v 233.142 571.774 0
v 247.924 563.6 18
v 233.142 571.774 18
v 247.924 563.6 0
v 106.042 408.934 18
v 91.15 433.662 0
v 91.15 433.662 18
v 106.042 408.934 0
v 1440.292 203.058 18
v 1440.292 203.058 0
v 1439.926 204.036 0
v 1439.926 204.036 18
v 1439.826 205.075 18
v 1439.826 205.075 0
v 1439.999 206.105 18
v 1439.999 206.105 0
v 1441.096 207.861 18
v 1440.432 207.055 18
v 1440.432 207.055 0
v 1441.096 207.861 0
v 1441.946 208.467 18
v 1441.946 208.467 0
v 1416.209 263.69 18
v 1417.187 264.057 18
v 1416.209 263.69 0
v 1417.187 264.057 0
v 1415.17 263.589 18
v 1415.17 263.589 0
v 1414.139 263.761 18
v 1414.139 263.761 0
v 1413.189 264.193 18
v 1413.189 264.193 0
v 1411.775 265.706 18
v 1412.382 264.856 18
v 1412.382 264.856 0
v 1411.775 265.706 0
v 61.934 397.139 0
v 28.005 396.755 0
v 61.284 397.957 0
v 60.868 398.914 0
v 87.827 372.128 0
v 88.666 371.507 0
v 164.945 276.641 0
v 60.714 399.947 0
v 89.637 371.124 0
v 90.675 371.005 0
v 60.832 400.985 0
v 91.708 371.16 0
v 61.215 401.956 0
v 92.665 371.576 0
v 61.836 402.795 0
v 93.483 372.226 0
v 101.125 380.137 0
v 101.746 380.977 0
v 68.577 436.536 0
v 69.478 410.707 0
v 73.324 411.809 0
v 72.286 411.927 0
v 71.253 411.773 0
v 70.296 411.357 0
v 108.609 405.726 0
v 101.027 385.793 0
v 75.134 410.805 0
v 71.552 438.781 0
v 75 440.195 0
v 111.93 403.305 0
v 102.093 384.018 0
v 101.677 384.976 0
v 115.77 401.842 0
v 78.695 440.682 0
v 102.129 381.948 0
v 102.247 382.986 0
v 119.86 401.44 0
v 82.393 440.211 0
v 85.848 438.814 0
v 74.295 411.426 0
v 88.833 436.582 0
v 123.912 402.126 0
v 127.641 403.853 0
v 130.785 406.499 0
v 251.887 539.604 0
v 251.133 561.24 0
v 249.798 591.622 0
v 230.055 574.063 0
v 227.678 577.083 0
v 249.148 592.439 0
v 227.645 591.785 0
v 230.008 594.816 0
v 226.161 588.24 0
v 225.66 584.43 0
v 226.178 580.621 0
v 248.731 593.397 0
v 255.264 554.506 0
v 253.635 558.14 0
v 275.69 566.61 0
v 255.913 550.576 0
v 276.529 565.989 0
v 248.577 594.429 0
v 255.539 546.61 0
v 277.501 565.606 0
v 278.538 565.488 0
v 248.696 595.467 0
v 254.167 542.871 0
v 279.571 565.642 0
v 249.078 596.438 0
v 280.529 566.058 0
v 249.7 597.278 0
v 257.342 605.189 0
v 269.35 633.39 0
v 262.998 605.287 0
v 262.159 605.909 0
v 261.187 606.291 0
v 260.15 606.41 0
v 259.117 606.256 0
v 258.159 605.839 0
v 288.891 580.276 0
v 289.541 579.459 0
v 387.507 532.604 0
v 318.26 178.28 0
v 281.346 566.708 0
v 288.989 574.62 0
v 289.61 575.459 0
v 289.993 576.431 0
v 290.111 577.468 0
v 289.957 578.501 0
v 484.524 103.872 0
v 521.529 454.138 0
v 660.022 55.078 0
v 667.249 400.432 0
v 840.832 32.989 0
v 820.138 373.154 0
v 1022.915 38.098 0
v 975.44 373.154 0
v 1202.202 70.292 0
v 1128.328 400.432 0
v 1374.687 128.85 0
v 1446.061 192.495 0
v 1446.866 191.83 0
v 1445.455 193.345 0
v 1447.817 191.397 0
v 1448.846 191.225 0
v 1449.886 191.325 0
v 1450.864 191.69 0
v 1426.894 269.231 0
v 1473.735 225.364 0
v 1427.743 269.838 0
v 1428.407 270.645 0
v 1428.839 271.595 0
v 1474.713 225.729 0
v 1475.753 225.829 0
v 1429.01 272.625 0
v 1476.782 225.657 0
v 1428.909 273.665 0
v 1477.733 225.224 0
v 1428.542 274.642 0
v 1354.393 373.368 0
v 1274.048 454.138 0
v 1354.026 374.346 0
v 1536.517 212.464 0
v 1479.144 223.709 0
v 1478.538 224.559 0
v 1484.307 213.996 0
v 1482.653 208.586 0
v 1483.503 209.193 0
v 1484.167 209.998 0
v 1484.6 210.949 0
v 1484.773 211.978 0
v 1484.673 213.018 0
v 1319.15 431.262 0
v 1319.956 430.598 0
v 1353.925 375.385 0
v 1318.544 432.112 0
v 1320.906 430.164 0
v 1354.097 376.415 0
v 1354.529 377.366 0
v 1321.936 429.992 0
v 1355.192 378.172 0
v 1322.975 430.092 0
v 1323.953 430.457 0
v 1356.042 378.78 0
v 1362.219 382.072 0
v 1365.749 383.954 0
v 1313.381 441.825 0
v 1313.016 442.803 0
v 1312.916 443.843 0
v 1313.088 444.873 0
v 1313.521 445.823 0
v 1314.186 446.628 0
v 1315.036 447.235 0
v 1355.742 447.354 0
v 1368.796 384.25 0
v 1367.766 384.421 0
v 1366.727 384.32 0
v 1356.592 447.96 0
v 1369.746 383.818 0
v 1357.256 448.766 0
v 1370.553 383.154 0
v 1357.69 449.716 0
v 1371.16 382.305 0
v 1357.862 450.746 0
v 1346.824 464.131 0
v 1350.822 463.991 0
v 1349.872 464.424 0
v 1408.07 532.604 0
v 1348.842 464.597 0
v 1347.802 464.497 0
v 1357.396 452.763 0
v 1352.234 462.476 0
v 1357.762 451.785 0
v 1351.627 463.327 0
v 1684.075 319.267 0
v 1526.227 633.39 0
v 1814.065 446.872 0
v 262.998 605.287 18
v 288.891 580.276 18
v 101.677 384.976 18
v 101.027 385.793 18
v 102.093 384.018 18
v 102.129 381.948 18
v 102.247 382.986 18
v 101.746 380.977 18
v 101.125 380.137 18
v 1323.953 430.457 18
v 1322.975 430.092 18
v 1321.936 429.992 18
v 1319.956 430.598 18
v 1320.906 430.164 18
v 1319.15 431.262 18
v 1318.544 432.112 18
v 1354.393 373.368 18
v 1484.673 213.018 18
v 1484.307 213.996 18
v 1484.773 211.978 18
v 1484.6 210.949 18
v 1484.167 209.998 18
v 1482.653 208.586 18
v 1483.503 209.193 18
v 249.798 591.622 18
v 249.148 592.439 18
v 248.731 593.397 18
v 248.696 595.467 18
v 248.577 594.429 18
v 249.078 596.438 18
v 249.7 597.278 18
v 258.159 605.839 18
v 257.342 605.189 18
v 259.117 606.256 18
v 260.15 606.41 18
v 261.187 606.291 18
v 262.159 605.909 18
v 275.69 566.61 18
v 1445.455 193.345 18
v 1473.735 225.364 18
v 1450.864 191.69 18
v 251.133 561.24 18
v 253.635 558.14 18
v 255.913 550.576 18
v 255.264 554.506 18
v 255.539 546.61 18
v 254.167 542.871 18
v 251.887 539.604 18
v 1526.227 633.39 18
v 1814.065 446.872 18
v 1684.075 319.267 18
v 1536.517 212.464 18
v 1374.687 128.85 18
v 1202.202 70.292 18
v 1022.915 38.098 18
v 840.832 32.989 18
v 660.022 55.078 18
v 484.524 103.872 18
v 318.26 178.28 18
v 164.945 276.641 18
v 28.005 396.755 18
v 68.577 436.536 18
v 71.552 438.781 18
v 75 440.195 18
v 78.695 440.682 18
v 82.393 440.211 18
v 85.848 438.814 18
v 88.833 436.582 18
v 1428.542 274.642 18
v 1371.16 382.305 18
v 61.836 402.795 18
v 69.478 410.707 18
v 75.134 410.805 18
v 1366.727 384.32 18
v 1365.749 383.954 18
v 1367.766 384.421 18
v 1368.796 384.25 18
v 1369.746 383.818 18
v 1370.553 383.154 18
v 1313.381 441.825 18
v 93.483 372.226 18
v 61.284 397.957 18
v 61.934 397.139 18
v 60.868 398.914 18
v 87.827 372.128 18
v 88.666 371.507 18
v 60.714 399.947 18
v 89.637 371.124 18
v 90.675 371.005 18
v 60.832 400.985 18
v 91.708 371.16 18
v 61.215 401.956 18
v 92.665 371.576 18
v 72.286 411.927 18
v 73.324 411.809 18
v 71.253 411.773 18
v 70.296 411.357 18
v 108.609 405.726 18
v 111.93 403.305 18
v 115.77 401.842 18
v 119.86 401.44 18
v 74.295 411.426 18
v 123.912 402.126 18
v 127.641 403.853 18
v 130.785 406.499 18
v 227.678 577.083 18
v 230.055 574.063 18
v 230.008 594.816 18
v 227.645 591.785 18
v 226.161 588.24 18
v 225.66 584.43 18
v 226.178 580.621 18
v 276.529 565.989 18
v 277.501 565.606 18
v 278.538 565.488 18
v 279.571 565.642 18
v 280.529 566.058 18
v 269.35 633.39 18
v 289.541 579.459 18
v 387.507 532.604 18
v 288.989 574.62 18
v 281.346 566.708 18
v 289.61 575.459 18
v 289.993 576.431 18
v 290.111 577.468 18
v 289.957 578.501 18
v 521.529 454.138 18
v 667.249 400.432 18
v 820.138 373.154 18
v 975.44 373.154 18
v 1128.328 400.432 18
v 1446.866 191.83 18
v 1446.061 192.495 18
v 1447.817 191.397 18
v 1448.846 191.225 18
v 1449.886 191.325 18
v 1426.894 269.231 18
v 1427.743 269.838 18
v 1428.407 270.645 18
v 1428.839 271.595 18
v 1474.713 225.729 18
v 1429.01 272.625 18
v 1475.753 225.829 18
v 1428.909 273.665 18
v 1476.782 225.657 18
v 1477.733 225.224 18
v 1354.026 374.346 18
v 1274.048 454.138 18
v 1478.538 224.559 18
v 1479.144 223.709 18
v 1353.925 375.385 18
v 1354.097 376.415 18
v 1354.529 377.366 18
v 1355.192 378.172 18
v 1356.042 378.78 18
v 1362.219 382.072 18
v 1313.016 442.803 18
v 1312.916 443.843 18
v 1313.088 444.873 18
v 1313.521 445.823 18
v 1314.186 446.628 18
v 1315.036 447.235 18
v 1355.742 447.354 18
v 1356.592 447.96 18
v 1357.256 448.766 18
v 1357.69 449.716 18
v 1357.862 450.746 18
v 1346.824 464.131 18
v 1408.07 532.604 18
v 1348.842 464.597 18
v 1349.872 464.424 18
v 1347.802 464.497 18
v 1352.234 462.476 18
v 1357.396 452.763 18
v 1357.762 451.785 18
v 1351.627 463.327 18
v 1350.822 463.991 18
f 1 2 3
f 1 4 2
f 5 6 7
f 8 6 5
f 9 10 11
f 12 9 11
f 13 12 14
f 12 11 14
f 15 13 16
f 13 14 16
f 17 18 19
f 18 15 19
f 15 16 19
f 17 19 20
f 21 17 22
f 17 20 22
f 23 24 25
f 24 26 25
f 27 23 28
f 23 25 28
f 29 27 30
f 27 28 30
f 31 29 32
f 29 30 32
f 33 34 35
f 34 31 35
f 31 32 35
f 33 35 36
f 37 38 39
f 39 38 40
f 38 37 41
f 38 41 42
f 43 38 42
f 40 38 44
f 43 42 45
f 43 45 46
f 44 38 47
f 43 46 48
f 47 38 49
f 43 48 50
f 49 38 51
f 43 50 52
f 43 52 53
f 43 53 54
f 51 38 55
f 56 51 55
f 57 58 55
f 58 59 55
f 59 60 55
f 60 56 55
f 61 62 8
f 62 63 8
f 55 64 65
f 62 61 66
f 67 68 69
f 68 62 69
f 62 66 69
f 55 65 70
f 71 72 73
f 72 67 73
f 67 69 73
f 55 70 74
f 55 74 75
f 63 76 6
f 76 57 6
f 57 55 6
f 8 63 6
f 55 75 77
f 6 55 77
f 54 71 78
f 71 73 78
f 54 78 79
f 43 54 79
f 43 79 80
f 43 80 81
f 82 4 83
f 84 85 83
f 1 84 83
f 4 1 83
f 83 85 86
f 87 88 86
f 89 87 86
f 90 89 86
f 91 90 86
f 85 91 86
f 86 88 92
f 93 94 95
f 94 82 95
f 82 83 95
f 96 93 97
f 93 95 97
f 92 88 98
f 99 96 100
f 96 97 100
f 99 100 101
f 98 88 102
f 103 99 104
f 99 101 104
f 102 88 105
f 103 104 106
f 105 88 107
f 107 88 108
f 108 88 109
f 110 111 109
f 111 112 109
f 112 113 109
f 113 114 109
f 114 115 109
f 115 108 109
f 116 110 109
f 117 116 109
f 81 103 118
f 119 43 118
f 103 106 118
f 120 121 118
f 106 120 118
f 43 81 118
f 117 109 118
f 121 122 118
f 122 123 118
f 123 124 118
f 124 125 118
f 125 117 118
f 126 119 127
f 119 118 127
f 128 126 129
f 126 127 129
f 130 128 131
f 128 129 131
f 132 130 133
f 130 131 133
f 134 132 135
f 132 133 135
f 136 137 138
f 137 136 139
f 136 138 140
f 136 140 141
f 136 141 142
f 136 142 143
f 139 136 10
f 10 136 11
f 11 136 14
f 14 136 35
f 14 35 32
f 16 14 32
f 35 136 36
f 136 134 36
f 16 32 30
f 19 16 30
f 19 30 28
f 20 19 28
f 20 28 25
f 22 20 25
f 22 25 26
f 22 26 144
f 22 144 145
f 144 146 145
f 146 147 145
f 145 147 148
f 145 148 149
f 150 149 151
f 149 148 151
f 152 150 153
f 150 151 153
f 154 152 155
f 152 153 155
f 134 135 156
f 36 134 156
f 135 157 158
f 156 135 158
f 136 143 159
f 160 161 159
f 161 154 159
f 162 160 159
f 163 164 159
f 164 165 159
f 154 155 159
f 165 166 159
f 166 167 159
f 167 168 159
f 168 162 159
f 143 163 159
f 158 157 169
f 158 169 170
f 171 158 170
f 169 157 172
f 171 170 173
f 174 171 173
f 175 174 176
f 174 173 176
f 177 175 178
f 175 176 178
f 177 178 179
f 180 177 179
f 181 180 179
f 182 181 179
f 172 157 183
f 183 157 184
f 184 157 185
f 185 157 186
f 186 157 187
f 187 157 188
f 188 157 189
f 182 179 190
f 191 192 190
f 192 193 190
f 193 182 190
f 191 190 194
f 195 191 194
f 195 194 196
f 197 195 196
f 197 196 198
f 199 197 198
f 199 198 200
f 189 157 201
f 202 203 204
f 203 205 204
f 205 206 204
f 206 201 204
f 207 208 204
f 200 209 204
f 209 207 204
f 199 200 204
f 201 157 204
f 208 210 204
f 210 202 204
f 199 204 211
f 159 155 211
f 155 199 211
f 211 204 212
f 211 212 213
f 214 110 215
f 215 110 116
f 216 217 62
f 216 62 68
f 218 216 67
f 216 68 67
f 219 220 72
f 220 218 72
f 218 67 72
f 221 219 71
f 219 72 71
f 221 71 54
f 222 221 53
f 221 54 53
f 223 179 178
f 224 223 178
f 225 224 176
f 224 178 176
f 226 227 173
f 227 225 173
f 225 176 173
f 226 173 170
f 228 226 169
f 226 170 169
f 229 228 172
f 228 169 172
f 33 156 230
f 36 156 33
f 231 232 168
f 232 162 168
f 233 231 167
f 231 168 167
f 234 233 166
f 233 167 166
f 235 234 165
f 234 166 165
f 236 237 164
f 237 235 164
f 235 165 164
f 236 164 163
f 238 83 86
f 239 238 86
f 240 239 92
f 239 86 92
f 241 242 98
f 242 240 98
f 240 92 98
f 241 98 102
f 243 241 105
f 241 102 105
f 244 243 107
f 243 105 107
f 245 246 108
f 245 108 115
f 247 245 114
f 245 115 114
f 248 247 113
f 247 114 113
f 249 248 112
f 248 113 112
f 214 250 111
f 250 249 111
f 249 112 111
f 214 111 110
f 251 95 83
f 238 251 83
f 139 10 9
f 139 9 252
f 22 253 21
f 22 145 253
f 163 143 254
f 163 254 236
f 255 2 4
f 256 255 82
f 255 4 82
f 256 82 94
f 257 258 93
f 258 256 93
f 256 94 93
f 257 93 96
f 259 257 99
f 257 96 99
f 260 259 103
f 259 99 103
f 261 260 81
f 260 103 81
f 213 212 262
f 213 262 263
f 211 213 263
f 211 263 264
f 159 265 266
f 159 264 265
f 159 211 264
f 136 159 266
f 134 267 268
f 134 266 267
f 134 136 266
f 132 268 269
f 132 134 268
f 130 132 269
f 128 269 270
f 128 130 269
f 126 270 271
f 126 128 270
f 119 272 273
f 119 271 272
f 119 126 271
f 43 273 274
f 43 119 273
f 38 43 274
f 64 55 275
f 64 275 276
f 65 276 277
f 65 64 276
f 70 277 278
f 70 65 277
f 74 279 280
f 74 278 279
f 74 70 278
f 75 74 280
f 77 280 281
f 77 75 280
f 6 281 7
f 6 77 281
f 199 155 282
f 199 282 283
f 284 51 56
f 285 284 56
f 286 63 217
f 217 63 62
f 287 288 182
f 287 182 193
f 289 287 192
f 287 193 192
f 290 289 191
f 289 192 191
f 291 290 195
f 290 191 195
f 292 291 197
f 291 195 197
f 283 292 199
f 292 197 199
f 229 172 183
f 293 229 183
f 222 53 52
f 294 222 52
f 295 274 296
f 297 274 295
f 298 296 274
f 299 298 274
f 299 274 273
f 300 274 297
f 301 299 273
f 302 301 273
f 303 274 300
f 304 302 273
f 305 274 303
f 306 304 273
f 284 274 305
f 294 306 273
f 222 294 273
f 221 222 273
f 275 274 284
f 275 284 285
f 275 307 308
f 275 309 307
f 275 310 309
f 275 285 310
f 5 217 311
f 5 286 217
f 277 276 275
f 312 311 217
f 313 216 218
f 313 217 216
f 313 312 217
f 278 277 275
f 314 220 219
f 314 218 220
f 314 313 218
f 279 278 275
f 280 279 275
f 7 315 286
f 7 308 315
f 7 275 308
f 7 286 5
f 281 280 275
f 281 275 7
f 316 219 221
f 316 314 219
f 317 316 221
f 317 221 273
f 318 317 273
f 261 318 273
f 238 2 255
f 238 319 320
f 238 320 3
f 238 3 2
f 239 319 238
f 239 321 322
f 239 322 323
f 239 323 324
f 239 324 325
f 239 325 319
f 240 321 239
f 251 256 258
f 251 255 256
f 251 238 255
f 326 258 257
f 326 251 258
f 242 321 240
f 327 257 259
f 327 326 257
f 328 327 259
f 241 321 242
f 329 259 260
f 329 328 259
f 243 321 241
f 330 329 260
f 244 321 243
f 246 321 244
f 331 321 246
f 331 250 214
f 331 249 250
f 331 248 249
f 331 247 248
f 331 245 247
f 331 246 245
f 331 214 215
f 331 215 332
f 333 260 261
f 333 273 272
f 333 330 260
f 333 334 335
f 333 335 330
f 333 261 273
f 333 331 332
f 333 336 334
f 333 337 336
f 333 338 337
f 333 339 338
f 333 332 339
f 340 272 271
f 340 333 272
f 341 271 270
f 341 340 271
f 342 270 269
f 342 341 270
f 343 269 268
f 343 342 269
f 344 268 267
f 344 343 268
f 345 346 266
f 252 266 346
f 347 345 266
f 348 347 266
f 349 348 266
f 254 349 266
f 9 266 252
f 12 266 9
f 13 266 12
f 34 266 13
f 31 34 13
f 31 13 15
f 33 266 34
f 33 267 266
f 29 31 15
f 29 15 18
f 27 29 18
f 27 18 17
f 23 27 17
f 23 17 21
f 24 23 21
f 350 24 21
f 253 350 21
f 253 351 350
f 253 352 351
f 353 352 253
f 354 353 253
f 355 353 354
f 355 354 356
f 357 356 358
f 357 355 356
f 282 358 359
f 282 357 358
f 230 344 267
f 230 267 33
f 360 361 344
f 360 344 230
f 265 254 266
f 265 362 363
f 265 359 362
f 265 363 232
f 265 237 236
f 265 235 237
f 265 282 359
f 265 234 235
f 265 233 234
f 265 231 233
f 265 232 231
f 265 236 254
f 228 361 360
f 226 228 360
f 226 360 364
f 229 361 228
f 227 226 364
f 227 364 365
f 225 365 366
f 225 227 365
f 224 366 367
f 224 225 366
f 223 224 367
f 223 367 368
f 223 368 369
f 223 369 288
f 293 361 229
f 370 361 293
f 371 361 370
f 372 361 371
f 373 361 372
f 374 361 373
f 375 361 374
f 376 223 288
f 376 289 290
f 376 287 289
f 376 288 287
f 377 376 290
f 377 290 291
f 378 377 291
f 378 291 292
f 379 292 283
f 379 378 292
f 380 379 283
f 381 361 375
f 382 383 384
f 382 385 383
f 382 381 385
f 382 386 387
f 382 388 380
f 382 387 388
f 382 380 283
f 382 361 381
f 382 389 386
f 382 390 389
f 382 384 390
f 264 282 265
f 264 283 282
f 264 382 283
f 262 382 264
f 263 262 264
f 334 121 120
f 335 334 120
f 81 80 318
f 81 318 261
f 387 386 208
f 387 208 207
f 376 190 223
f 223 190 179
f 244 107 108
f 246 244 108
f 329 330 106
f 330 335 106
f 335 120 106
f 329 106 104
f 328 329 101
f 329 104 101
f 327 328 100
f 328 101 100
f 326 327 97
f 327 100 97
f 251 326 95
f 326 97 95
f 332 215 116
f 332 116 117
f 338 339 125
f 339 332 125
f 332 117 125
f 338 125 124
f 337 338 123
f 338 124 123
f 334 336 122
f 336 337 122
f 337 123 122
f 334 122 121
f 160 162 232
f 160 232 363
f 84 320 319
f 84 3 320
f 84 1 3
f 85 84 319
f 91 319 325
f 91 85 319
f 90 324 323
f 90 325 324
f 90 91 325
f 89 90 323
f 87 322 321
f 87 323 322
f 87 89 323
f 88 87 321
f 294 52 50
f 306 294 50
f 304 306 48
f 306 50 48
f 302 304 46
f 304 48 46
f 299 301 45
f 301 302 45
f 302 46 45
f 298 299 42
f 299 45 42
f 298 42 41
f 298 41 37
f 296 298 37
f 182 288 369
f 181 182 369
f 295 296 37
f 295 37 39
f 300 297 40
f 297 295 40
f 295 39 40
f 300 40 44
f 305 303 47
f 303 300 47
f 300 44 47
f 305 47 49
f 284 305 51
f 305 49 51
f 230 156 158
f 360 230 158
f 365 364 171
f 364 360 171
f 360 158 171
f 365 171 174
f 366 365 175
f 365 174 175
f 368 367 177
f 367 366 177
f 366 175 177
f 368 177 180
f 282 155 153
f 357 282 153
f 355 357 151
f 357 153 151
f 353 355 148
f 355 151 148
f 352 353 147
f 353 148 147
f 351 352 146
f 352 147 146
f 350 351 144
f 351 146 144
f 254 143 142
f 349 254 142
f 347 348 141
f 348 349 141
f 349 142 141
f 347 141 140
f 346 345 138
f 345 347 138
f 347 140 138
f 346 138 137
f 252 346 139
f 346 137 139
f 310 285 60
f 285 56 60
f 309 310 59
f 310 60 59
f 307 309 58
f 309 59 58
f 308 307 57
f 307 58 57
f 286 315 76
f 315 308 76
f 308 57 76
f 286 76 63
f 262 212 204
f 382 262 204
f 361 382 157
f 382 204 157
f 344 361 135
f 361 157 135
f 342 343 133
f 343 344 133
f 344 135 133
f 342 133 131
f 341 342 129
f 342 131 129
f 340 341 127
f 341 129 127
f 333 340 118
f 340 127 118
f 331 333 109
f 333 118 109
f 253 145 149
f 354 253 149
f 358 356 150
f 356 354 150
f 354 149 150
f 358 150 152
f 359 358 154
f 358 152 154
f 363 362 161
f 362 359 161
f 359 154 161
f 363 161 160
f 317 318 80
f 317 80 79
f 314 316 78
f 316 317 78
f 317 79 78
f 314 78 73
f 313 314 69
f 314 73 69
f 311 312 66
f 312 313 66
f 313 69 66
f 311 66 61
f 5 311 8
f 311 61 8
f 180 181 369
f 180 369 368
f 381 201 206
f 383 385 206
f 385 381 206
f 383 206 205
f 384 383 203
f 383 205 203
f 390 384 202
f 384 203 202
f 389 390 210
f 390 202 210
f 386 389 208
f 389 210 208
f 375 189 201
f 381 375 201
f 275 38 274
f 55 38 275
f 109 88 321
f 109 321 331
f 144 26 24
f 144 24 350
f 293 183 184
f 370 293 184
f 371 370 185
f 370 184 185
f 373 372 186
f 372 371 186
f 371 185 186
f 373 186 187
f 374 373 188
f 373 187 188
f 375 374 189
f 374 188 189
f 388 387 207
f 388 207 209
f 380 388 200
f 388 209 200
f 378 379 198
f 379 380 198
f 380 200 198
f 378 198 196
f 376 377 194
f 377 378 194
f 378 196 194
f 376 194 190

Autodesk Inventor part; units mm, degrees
ref_plane "YZ Plane" through (0, 0, 0) normal (1, 0, 0) x (0, 1, 0)
ref_plane "XZ Plane" through (0, 0, 0) normal (0, 1, 0) x (-1, 0, 0)
ref_plane "XY Plane" through (0, 0, 0) normal (0, 0, 1) x (1, 0, 0)
sketch "CONTOURS" plane through (0, 0, 0) normal (0, 0, 1) x (1, 0, 0)
  arc A0 (28.0046, 396.7552) -> (1814.0653, 446.8716) centre (897.7889, 1250.2638) ccw
  line L0 (28.0046, 396.7552) -> (68.5769, 436.5356)
  arc A1 (91.1499, 433.6624) -> (68.5769, 436.5356) centre (78.7284, 426.182) ccw
  line L1 (91.1499, 433.6624) -> (106.0415, 408.9341)
  arc A2 (106.0415, 408.9341) -> (130.7846, 406.4993) centre (119.3197, 416.9304) ccw
  line L2 (130.7846, 406.4993) -> (251.8873, 539.6044)
  arc A3 (251.8873, 539.6044) -> (247.9235, 563.5995) centre (240.4224, 550.0355) ccw
  line L3 (247.9235, 563.5995) -> (233.1425, 571.7736)
  arc A4 (230.0082, 594.8161) -> (233.1425, 571.7736) centre (240.1597, 584.4626) ccw
  line L4 (230.0082, 594.8161) -> (269.3503, 633.3904)
  arc A5 (269.3503, 633.3904) -> (1526.2271, 633.3904) centre (897.7887, 1250.4881) ccw
  line L5 (1526.2271, 633.3904) -> (1814.0653, 446.8716)
sketch "HOLES" plane through (0, 0, 0) normal (0, 0, 1) x (1, 0, 0)
  arc A0 (288.9886, 574.6199) -> (288.8907, 580.2759) centre (286.1117, 577.3989) ccw
  line L0 (288.9886, 574.6199) -> (281.3462, 566.7082)
  arc A1 (275.6902, 566.6103) -> (281.3462, 566.7082) centre (278.4693, 569.4873) ccw
  line L1 (275.6902, 566.6103) -> (249.7976, 591.6217)
  arc A2 (249.6997, 597.2778) -> (249.7976, 591.6217) centre (252.5767, 594.4987) ccw
  line L2 (1440.2918, 203.0579) -> (1445.4546, 193.3448)
  arc A3 (1445.4546, 193.3448) -> (1450.864, 191.6901) centre (1448.9867, 195.2221) ccw
  line L3 (1450.864, 191.6901) -> (1482.6526, 208.5865)
  arc A4 (1482.6526, 208.5865) -> (1484.3073, 213.9959) centre (1480.7752, 212.1185) ccw
  line L4 (1484.3073, 213.9959) -> (1479.1445, 223.7091)
  arc A5 (1479.1445, 223.7091) -> (1473.735, 225.3638) centre (1475.6124, 221.8317) ccw
  line L5 (1473.735, 225.3638) -> (1441.9465, 208.4674)
  arc A6 (1441.9465, 208.4674) -> (1440.2918, 203.0579) centre (1443.8239, 204.9353) ccw
  line L6 (101.125, 380.1374) -> (93.4826, 372.2258)
  arc A7 (87.8266, 372.1279) -> (93.4826, 372.2258) centre (90.6056, 375.0048) ccw
  line L7 (87.8266, 372.1279) -> (61.9339, 397.1393)
  arc A8 (61.836, 402.7953) -> (61.9339, 397.1393) centre (64.713, 400.0162) ccw
  line L8 (61.836, 402.7953) -> (69.4784, 410.7069)
  arc A9 (75.1344, 410.8048) -> (69.4784, 410.7069) centre (72.3554, 407.9279) ccw
  line L9 (75.1344, 410.8048) -> (101.027, 385.7934)
  arc A10 (101.125, 380.1374) -> (101.027, 385.7934) centre (98.248, 382.9165) ccw
  line L10 (1362.2188, 382.0722) -> (1356.0415, 378.7797)
  arc A11 (1356.0415, 378.7797) -> (1354.3929, 373.3684) centre (1357.9229, 375.2498) ccw
  line L11 (1354.3929, 373.3684) -> (1411.7752, 265.7057)
  arc A12 (1411.7752, 265.7057) -> (1417.1866, 264.0571) centre (1415.3052, 267.587) ccw
  line L12 (1417.1866, 264.0571) -> (1426.8939, 269.2309)
  arc A13 (1426.8939, 269.2309) -> (1428.5424, 274.6423) centre (1425.0125, 272.7609) ccw
  line L13 (1428.5424, 274.6423) -> (1371.1601, 382.305)
  arc A14 (1371.1601, 382.305) -> (1365.7488, 383.9536) centre (1367.6302, 380.4236) ccw
  line L14 (1365.7488, 383.9536) -> (1362.2188, 382.0722)
  line L15 (249.6997, 597.2778) -> (257.3421, 605.1894)
  arc A15 (262.9981, 605.2873) -> (257.3421, 605.1894) centre (260.219, 602.4103) ccw
  line L16 (262.9981, 605.2873) -> (288.8907, 580.2759)
  line L17 (1318.5439, 432.1121) -> (1313.3811, 441.8253)
  arc A16 (1315.0357, 447.2347) -> (1313.3811, 441.8253) centre (1316.9131, 443.7027) ccw
  line L18 (1315.0357, 447.2347) -> (1346.8243, 464.1311)
  arc A17 (1352.2337, 462.4764) -> (1346.8243, 464.1311) centre (1348.7017, 460.5991) ccw
  line L19 (1352.2337, 462.4764) -> (1357.3965, 452.7633)
  arc A18 (1355.7418, 447.3538) -> (1357.3965, 452.7633) centre (1353.8645, 450.8859) ccw
  line L20 (1355.7418, 447.3538) -> (1323.9533, 430.4574)
  arc A19 (1318.5439, 432.1121) -> (1323.9533, 430.4574) centre (1322.0759, 433.9895) ccw
sketch "LETTERS" plane through (0, 0, 0) normal (0, 0, 1) x (1, 0, 0)
  line L0 (243.6817, 427.6795) -> (251.9783, 420.9747)
  line L1 (249.8017, 435.2055) -> (237.3515, 419.7995)
  line L2 (237.3515, 419.7995) -> (248.775, 410.5677)
  line L3 (261.2252, 425.9736) -> (249.8017, 435.2055)
extrude "Extrusion1" add sketch "CONTOURS" along normal blind 18
extrude "Extrusion2" cut sketch "HOLES" along normal blind 18
properties part number "Platform E4" material "Wood (Birch)"
